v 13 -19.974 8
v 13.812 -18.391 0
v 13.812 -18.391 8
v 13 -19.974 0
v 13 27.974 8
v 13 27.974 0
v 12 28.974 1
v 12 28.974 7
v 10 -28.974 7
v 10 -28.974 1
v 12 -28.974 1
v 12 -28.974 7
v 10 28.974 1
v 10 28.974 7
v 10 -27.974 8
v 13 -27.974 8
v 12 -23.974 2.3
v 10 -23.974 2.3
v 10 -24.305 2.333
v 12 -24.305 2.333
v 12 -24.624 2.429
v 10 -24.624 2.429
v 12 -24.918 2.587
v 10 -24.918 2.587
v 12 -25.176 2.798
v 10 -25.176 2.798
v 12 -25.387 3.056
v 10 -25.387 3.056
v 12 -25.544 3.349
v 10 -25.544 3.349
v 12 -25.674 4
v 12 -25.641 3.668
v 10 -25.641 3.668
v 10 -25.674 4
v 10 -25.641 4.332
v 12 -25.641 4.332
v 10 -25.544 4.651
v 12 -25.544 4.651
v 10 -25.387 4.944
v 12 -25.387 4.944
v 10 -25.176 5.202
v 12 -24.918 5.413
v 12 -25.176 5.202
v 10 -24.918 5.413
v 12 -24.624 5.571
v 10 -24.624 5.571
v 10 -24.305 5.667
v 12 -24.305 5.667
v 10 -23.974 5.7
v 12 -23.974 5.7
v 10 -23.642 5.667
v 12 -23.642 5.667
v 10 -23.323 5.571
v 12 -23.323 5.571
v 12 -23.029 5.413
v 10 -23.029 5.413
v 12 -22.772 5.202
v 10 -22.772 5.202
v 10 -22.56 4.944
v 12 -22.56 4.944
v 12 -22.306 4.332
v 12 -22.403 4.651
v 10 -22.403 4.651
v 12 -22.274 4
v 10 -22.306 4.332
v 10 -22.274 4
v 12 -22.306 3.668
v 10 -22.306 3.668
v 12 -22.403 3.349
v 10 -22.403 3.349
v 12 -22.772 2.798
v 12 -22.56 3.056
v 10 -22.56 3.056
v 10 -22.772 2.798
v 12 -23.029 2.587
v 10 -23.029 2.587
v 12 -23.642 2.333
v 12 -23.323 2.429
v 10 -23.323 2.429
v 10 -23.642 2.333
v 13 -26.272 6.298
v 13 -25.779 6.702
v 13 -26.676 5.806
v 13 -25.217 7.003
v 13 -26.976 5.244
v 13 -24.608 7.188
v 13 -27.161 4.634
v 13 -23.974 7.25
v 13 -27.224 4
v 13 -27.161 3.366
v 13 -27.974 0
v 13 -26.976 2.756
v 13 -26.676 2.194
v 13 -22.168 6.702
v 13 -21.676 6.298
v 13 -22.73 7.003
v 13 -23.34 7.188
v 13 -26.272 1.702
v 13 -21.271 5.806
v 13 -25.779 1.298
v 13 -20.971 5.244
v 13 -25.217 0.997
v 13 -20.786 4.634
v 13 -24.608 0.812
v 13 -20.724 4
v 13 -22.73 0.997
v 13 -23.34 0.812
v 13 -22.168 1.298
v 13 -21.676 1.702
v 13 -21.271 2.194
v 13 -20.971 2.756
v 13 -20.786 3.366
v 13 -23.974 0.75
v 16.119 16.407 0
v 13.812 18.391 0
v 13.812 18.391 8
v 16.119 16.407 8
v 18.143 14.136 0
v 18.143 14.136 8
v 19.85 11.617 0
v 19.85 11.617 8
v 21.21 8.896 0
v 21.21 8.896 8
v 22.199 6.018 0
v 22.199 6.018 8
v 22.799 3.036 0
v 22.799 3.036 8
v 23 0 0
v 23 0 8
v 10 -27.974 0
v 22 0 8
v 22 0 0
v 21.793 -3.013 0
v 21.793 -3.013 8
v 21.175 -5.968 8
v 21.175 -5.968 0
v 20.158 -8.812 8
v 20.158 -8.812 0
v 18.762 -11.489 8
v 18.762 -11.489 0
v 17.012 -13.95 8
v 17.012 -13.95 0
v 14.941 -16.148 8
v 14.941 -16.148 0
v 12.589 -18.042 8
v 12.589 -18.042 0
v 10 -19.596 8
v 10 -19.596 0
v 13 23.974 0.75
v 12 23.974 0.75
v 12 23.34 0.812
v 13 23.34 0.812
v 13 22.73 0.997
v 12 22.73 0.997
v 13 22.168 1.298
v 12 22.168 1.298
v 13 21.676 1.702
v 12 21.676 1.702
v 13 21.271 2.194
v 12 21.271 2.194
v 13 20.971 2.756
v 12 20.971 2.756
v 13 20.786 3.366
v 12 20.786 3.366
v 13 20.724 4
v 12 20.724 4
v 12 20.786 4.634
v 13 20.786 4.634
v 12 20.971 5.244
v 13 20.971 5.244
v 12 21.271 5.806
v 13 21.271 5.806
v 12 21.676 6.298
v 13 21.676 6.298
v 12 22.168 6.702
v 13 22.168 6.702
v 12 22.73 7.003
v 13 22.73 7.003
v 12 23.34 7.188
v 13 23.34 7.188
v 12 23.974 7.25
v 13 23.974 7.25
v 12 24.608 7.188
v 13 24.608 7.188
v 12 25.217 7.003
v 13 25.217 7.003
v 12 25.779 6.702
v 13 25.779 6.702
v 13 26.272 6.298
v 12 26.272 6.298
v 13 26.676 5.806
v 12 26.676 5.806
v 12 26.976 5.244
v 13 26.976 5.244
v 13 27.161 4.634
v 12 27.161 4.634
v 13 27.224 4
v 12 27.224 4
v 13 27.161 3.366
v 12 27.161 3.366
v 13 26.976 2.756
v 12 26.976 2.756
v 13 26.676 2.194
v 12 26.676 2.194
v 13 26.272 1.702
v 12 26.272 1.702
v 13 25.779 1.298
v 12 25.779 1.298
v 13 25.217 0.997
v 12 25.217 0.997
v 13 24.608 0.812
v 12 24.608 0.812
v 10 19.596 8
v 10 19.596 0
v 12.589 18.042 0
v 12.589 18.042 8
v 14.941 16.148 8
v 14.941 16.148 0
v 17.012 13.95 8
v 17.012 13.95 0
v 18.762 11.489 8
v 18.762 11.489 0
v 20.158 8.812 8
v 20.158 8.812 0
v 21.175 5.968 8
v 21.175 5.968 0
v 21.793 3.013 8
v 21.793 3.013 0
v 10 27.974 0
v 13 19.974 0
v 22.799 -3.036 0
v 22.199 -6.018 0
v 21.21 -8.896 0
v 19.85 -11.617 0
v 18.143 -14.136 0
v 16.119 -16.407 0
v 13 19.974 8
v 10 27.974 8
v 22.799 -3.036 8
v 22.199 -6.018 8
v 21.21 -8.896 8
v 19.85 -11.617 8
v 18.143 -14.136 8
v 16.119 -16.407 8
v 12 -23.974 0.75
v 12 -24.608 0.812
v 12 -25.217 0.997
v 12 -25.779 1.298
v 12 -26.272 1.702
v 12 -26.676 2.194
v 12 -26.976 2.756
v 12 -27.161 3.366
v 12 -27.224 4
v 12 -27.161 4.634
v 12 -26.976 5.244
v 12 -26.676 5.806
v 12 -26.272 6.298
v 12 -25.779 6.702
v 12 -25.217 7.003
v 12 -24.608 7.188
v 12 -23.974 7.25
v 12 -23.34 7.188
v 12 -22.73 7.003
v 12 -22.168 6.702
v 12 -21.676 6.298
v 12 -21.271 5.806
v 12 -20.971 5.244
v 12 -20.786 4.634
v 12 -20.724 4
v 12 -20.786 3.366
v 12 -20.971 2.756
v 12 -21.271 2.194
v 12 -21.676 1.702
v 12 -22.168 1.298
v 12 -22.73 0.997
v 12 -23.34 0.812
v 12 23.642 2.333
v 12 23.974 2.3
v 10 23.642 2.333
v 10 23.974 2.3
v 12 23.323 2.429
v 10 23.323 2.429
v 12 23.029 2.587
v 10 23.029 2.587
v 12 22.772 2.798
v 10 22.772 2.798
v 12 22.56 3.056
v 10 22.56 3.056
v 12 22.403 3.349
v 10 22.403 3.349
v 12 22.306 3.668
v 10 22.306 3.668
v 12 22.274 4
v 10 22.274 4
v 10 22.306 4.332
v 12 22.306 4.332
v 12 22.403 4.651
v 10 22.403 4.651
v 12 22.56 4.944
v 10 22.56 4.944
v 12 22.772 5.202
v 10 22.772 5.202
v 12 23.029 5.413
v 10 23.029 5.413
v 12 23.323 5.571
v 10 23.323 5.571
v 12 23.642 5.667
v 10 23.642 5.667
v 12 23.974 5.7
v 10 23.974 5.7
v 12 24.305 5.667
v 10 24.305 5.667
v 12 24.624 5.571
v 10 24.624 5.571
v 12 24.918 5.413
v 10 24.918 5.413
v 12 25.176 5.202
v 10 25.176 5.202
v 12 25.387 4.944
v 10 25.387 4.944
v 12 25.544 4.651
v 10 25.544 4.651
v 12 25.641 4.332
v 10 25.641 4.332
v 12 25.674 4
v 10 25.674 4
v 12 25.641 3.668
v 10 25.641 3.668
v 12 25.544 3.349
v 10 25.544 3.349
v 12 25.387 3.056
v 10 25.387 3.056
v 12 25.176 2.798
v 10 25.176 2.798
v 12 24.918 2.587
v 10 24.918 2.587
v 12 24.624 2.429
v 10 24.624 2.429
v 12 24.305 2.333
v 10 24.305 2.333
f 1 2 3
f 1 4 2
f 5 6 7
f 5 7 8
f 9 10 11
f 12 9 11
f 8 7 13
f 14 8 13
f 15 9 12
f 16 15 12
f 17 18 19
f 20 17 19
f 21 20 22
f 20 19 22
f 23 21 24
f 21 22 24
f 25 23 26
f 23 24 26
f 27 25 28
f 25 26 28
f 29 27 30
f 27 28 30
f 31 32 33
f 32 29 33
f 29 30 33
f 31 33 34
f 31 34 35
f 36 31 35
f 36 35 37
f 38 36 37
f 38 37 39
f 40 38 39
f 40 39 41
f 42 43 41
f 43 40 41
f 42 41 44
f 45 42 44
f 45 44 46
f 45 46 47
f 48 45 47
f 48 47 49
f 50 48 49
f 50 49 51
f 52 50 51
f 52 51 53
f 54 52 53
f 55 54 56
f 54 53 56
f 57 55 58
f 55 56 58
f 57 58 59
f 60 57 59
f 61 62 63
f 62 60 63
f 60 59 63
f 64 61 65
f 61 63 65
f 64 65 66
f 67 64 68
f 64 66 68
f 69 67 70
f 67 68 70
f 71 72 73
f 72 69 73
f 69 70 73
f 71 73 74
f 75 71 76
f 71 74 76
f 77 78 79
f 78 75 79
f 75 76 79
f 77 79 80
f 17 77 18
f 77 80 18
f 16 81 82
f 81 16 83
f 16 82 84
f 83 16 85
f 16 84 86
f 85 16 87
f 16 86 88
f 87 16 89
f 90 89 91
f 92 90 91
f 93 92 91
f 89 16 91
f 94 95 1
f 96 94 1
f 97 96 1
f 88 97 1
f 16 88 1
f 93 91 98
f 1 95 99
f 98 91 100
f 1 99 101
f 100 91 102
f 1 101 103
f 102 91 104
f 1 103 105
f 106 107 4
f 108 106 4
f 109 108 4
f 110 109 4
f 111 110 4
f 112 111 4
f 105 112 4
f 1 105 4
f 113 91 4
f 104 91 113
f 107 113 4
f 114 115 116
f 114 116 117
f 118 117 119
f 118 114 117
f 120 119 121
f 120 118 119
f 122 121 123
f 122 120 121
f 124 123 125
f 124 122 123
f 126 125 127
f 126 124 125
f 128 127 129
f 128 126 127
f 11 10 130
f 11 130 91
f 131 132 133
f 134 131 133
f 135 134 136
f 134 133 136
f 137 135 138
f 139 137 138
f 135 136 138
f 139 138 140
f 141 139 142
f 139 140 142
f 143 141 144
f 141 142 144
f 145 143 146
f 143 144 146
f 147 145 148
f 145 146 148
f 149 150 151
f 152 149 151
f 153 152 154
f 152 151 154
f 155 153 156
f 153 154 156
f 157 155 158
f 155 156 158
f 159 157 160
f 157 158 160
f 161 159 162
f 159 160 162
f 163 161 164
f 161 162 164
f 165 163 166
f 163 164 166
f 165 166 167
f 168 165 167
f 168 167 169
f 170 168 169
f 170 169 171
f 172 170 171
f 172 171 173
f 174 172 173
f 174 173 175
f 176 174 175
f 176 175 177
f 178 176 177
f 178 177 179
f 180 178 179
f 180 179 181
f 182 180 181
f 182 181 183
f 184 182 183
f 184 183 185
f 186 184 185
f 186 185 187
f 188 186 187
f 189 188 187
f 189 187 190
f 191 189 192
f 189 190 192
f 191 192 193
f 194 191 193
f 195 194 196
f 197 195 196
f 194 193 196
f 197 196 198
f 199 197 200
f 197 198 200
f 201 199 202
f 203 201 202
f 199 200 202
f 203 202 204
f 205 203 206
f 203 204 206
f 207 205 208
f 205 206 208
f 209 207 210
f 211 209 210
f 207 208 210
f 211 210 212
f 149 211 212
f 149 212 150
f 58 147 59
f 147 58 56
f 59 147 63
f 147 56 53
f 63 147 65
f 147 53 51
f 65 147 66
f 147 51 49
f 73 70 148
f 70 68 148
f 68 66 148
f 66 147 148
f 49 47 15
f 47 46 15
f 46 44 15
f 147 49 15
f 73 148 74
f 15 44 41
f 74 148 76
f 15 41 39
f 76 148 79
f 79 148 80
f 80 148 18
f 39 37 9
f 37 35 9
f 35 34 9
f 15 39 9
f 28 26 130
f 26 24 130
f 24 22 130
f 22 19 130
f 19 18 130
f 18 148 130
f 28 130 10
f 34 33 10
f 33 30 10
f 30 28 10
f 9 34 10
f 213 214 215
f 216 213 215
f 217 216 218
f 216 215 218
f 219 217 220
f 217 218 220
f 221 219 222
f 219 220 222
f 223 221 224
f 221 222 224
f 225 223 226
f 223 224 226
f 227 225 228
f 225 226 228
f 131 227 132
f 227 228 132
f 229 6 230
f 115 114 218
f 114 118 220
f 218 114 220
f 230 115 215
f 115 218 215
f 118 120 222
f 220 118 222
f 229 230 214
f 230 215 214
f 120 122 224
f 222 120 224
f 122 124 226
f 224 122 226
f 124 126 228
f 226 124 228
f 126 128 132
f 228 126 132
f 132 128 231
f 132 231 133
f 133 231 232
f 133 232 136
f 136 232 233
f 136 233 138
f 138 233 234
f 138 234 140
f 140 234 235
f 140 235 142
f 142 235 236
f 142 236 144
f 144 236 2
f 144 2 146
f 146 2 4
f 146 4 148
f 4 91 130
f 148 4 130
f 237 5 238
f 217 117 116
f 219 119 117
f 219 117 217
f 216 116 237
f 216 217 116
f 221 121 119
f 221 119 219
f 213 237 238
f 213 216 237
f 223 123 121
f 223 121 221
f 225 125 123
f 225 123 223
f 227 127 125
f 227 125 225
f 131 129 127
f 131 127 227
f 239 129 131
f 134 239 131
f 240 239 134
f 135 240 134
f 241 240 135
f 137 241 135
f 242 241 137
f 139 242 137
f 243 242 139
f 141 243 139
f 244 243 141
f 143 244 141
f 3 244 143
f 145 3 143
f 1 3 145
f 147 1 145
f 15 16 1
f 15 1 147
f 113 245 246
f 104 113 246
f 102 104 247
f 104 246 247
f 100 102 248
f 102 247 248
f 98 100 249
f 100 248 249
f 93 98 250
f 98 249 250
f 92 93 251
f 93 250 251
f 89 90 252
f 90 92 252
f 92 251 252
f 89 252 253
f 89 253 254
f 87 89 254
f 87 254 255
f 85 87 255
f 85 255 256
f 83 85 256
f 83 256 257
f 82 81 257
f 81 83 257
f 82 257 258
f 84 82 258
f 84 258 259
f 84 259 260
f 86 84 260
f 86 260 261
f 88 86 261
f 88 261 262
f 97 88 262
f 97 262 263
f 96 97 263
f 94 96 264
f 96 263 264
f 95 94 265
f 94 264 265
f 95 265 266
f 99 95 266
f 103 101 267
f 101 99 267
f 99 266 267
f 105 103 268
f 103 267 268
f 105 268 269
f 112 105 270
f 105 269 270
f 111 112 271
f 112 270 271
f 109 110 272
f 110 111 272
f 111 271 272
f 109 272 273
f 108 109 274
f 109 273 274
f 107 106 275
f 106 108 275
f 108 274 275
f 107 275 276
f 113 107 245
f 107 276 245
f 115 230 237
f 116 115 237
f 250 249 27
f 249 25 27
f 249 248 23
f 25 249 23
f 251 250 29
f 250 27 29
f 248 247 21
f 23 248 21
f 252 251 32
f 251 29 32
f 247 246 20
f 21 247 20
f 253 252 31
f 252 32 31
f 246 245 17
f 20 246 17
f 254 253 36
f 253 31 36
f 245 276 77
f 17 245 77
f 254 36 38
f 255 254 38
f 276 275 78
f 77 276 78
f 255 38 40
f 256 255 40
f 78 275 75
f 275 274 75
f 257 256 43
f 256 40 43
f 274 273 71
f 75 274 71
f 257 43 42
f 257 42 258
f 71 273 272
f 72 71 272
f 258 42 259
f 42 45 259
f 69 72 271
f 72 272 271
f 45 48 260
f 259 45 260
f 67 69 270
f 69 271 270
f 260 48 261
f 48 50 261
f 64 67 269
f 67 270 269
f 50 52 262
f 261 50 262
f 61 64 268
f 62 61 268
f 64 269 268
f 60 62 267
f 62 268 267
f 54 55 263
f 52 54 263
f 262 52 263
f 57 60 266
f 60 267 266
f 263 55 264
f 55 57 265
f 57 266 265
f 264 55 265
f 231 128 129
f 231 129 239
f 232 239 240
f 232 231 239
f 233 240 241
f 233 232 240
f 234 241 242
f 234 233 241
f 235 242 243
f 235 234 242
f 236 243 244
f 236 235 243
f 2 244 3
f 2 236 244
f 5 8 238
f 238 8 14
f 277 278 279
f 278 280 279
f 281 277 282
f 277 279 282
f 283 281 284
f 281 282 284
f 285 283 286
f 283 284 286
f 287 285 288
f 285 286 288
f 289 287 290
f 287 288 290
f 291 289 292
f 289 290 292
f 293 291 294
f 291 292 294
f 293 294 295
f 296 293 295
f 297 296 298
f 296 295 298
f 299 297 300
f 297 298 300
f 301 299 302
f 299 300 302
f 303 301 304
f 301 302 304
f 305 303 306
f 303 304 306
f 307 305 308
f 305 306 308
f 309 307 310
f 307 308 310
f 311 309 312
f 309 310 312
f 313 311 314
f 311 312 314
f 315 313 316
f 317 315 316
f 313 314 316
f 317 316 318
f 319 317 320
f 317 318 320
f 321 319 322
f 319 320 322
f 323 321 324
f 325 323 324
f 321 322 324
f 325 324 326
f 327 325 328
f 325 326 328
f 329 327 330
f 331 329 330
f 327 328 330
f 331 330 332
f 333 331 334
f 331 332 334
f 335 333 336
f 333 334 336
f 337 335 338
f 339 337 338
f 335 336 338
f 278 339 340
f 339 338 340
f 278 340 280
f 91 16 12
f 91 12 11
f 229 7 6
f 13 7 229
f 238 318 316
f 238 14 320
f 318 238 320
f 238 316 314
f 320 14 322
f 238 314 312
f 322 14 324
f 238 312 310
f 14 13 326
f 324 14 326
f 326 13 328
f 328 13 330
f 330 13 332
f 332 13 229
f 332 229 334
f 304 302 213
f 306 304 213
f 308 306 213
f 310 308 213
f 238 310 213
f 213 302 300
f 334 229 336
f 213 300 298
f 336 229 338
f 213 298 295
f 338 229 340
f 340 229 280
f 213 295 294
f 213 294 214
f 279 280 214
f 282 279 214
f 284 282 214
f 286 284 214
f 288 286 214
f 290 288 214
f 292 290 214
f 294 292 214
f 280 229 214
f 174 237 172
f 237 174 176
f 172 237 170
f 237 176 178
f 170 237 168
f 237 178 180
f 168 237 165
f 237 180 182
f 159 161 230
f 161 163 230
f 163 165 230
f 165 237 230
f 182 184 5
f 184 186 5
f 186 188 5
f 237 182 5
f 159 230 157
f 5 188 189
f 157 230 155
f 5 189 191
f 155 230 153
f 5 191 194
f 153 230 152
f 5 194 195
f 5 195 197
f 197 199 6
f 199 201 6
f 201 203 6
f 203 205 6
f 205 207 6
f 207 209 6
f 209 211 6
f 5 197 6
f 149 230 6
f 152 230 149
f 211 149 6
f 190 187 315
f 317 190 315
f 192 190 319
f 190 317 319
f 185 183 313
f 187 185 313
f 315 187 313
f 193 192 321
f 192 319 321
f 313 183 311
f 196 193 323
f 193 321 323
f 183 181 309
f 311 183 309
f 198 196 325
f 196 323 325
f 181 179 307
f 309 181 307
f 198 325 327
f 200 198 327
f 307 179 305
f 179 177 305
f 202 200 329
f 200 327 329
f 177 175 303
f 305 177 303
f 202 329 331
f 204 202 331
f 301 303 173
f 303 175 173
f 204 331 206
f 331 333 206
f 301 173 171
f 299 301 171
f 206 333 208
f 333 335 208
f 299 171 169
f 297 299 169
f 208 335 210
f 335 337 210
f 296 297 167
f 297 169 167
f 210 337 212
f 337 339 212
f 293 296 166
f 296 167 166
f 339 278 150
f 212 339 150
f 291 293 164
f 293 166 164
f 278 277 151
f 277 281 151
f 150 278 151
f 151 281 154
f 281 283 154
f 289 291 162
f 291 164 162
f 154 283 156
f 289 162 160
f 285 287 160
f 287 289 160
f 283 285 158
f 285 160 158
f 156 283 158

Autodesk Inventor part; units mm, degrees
ref_plane "YZ Plane" through (0, 0, 0) normal (1, 0, 0) x (0, 1, 0)
ref_plane "XZ Plane" through (0, 0, 0) normal (0, 1, 0) x (-1, 0, 0)
ref_plane "XY Plane" through (0, 0, 0) normal (0, 0, 1) x (1, 0, 0)
sketch "Esquisse1" plane through (0, 0, 0) normal (0, 0, 1) x (1, 0, 0)
  arc A0 (22, 0) -> (10, 19.5959) centre (0, 0) ccw
  arc A1 (23, 0) -> (13, 18.9737) centre (0, 0) ccw
  line L0 (13, 18.9737) -> (13, 28.9737)
  line L1 (13, 28.9737) -> (10, 28.9737)
  line L2 (10, 28.9737) -> (10, 19.5959)
  line L3 (23, 0) -> (22, 0)
  dimension "d0" = 1
  dimension "d1" = 22
  dimension "d2" = 10
  dimension "d3" = 3
  dimension "d4" = 10
extrude "Extrusion1" add sketch "Esquisse1" along normal blind 8
sketch "Esquisse2" plane through (13, 18.9737, 0) normal (1, 0, 0) x (0, 0, -1)
  line L0 (0, 0) -> (0, 10) projected
  line L1 (0, 10) -> (-8, 10) projected
  line L2 (-8, 0) -> (-8, 10) projected
  line L3 (0, 0) -> (-8, 0) projected
  point P0 (0, -18.9737)
  point P1 (-4, 5)
  point P2 (0, 5)
  point P3 (-4, 10)
hole "Perçage1" at (13, 23.9737, 4) direction (-1, 0, 0) diameter 3.4 depth 3 counterbore diameter 6.5 counterbore depth 1 clearance for "Vis d'assemblage à six pans creux ISO 4762" size "M3" standard "ISO"
chamfer "Chanfrein1" distance 1 angle 45 4 edges at (13, 28.9737, 4) (11.5, 28.9737, 8) (11.5, 28.9737, 0) (13, 18.9737, 4)
mirror "Symétrie1" about plane through (22, 0, 0) normal (0, -1, 0) of "Extrusion1", "Perçage1", "Chanfrein1"
properties part number "guide_attache"
